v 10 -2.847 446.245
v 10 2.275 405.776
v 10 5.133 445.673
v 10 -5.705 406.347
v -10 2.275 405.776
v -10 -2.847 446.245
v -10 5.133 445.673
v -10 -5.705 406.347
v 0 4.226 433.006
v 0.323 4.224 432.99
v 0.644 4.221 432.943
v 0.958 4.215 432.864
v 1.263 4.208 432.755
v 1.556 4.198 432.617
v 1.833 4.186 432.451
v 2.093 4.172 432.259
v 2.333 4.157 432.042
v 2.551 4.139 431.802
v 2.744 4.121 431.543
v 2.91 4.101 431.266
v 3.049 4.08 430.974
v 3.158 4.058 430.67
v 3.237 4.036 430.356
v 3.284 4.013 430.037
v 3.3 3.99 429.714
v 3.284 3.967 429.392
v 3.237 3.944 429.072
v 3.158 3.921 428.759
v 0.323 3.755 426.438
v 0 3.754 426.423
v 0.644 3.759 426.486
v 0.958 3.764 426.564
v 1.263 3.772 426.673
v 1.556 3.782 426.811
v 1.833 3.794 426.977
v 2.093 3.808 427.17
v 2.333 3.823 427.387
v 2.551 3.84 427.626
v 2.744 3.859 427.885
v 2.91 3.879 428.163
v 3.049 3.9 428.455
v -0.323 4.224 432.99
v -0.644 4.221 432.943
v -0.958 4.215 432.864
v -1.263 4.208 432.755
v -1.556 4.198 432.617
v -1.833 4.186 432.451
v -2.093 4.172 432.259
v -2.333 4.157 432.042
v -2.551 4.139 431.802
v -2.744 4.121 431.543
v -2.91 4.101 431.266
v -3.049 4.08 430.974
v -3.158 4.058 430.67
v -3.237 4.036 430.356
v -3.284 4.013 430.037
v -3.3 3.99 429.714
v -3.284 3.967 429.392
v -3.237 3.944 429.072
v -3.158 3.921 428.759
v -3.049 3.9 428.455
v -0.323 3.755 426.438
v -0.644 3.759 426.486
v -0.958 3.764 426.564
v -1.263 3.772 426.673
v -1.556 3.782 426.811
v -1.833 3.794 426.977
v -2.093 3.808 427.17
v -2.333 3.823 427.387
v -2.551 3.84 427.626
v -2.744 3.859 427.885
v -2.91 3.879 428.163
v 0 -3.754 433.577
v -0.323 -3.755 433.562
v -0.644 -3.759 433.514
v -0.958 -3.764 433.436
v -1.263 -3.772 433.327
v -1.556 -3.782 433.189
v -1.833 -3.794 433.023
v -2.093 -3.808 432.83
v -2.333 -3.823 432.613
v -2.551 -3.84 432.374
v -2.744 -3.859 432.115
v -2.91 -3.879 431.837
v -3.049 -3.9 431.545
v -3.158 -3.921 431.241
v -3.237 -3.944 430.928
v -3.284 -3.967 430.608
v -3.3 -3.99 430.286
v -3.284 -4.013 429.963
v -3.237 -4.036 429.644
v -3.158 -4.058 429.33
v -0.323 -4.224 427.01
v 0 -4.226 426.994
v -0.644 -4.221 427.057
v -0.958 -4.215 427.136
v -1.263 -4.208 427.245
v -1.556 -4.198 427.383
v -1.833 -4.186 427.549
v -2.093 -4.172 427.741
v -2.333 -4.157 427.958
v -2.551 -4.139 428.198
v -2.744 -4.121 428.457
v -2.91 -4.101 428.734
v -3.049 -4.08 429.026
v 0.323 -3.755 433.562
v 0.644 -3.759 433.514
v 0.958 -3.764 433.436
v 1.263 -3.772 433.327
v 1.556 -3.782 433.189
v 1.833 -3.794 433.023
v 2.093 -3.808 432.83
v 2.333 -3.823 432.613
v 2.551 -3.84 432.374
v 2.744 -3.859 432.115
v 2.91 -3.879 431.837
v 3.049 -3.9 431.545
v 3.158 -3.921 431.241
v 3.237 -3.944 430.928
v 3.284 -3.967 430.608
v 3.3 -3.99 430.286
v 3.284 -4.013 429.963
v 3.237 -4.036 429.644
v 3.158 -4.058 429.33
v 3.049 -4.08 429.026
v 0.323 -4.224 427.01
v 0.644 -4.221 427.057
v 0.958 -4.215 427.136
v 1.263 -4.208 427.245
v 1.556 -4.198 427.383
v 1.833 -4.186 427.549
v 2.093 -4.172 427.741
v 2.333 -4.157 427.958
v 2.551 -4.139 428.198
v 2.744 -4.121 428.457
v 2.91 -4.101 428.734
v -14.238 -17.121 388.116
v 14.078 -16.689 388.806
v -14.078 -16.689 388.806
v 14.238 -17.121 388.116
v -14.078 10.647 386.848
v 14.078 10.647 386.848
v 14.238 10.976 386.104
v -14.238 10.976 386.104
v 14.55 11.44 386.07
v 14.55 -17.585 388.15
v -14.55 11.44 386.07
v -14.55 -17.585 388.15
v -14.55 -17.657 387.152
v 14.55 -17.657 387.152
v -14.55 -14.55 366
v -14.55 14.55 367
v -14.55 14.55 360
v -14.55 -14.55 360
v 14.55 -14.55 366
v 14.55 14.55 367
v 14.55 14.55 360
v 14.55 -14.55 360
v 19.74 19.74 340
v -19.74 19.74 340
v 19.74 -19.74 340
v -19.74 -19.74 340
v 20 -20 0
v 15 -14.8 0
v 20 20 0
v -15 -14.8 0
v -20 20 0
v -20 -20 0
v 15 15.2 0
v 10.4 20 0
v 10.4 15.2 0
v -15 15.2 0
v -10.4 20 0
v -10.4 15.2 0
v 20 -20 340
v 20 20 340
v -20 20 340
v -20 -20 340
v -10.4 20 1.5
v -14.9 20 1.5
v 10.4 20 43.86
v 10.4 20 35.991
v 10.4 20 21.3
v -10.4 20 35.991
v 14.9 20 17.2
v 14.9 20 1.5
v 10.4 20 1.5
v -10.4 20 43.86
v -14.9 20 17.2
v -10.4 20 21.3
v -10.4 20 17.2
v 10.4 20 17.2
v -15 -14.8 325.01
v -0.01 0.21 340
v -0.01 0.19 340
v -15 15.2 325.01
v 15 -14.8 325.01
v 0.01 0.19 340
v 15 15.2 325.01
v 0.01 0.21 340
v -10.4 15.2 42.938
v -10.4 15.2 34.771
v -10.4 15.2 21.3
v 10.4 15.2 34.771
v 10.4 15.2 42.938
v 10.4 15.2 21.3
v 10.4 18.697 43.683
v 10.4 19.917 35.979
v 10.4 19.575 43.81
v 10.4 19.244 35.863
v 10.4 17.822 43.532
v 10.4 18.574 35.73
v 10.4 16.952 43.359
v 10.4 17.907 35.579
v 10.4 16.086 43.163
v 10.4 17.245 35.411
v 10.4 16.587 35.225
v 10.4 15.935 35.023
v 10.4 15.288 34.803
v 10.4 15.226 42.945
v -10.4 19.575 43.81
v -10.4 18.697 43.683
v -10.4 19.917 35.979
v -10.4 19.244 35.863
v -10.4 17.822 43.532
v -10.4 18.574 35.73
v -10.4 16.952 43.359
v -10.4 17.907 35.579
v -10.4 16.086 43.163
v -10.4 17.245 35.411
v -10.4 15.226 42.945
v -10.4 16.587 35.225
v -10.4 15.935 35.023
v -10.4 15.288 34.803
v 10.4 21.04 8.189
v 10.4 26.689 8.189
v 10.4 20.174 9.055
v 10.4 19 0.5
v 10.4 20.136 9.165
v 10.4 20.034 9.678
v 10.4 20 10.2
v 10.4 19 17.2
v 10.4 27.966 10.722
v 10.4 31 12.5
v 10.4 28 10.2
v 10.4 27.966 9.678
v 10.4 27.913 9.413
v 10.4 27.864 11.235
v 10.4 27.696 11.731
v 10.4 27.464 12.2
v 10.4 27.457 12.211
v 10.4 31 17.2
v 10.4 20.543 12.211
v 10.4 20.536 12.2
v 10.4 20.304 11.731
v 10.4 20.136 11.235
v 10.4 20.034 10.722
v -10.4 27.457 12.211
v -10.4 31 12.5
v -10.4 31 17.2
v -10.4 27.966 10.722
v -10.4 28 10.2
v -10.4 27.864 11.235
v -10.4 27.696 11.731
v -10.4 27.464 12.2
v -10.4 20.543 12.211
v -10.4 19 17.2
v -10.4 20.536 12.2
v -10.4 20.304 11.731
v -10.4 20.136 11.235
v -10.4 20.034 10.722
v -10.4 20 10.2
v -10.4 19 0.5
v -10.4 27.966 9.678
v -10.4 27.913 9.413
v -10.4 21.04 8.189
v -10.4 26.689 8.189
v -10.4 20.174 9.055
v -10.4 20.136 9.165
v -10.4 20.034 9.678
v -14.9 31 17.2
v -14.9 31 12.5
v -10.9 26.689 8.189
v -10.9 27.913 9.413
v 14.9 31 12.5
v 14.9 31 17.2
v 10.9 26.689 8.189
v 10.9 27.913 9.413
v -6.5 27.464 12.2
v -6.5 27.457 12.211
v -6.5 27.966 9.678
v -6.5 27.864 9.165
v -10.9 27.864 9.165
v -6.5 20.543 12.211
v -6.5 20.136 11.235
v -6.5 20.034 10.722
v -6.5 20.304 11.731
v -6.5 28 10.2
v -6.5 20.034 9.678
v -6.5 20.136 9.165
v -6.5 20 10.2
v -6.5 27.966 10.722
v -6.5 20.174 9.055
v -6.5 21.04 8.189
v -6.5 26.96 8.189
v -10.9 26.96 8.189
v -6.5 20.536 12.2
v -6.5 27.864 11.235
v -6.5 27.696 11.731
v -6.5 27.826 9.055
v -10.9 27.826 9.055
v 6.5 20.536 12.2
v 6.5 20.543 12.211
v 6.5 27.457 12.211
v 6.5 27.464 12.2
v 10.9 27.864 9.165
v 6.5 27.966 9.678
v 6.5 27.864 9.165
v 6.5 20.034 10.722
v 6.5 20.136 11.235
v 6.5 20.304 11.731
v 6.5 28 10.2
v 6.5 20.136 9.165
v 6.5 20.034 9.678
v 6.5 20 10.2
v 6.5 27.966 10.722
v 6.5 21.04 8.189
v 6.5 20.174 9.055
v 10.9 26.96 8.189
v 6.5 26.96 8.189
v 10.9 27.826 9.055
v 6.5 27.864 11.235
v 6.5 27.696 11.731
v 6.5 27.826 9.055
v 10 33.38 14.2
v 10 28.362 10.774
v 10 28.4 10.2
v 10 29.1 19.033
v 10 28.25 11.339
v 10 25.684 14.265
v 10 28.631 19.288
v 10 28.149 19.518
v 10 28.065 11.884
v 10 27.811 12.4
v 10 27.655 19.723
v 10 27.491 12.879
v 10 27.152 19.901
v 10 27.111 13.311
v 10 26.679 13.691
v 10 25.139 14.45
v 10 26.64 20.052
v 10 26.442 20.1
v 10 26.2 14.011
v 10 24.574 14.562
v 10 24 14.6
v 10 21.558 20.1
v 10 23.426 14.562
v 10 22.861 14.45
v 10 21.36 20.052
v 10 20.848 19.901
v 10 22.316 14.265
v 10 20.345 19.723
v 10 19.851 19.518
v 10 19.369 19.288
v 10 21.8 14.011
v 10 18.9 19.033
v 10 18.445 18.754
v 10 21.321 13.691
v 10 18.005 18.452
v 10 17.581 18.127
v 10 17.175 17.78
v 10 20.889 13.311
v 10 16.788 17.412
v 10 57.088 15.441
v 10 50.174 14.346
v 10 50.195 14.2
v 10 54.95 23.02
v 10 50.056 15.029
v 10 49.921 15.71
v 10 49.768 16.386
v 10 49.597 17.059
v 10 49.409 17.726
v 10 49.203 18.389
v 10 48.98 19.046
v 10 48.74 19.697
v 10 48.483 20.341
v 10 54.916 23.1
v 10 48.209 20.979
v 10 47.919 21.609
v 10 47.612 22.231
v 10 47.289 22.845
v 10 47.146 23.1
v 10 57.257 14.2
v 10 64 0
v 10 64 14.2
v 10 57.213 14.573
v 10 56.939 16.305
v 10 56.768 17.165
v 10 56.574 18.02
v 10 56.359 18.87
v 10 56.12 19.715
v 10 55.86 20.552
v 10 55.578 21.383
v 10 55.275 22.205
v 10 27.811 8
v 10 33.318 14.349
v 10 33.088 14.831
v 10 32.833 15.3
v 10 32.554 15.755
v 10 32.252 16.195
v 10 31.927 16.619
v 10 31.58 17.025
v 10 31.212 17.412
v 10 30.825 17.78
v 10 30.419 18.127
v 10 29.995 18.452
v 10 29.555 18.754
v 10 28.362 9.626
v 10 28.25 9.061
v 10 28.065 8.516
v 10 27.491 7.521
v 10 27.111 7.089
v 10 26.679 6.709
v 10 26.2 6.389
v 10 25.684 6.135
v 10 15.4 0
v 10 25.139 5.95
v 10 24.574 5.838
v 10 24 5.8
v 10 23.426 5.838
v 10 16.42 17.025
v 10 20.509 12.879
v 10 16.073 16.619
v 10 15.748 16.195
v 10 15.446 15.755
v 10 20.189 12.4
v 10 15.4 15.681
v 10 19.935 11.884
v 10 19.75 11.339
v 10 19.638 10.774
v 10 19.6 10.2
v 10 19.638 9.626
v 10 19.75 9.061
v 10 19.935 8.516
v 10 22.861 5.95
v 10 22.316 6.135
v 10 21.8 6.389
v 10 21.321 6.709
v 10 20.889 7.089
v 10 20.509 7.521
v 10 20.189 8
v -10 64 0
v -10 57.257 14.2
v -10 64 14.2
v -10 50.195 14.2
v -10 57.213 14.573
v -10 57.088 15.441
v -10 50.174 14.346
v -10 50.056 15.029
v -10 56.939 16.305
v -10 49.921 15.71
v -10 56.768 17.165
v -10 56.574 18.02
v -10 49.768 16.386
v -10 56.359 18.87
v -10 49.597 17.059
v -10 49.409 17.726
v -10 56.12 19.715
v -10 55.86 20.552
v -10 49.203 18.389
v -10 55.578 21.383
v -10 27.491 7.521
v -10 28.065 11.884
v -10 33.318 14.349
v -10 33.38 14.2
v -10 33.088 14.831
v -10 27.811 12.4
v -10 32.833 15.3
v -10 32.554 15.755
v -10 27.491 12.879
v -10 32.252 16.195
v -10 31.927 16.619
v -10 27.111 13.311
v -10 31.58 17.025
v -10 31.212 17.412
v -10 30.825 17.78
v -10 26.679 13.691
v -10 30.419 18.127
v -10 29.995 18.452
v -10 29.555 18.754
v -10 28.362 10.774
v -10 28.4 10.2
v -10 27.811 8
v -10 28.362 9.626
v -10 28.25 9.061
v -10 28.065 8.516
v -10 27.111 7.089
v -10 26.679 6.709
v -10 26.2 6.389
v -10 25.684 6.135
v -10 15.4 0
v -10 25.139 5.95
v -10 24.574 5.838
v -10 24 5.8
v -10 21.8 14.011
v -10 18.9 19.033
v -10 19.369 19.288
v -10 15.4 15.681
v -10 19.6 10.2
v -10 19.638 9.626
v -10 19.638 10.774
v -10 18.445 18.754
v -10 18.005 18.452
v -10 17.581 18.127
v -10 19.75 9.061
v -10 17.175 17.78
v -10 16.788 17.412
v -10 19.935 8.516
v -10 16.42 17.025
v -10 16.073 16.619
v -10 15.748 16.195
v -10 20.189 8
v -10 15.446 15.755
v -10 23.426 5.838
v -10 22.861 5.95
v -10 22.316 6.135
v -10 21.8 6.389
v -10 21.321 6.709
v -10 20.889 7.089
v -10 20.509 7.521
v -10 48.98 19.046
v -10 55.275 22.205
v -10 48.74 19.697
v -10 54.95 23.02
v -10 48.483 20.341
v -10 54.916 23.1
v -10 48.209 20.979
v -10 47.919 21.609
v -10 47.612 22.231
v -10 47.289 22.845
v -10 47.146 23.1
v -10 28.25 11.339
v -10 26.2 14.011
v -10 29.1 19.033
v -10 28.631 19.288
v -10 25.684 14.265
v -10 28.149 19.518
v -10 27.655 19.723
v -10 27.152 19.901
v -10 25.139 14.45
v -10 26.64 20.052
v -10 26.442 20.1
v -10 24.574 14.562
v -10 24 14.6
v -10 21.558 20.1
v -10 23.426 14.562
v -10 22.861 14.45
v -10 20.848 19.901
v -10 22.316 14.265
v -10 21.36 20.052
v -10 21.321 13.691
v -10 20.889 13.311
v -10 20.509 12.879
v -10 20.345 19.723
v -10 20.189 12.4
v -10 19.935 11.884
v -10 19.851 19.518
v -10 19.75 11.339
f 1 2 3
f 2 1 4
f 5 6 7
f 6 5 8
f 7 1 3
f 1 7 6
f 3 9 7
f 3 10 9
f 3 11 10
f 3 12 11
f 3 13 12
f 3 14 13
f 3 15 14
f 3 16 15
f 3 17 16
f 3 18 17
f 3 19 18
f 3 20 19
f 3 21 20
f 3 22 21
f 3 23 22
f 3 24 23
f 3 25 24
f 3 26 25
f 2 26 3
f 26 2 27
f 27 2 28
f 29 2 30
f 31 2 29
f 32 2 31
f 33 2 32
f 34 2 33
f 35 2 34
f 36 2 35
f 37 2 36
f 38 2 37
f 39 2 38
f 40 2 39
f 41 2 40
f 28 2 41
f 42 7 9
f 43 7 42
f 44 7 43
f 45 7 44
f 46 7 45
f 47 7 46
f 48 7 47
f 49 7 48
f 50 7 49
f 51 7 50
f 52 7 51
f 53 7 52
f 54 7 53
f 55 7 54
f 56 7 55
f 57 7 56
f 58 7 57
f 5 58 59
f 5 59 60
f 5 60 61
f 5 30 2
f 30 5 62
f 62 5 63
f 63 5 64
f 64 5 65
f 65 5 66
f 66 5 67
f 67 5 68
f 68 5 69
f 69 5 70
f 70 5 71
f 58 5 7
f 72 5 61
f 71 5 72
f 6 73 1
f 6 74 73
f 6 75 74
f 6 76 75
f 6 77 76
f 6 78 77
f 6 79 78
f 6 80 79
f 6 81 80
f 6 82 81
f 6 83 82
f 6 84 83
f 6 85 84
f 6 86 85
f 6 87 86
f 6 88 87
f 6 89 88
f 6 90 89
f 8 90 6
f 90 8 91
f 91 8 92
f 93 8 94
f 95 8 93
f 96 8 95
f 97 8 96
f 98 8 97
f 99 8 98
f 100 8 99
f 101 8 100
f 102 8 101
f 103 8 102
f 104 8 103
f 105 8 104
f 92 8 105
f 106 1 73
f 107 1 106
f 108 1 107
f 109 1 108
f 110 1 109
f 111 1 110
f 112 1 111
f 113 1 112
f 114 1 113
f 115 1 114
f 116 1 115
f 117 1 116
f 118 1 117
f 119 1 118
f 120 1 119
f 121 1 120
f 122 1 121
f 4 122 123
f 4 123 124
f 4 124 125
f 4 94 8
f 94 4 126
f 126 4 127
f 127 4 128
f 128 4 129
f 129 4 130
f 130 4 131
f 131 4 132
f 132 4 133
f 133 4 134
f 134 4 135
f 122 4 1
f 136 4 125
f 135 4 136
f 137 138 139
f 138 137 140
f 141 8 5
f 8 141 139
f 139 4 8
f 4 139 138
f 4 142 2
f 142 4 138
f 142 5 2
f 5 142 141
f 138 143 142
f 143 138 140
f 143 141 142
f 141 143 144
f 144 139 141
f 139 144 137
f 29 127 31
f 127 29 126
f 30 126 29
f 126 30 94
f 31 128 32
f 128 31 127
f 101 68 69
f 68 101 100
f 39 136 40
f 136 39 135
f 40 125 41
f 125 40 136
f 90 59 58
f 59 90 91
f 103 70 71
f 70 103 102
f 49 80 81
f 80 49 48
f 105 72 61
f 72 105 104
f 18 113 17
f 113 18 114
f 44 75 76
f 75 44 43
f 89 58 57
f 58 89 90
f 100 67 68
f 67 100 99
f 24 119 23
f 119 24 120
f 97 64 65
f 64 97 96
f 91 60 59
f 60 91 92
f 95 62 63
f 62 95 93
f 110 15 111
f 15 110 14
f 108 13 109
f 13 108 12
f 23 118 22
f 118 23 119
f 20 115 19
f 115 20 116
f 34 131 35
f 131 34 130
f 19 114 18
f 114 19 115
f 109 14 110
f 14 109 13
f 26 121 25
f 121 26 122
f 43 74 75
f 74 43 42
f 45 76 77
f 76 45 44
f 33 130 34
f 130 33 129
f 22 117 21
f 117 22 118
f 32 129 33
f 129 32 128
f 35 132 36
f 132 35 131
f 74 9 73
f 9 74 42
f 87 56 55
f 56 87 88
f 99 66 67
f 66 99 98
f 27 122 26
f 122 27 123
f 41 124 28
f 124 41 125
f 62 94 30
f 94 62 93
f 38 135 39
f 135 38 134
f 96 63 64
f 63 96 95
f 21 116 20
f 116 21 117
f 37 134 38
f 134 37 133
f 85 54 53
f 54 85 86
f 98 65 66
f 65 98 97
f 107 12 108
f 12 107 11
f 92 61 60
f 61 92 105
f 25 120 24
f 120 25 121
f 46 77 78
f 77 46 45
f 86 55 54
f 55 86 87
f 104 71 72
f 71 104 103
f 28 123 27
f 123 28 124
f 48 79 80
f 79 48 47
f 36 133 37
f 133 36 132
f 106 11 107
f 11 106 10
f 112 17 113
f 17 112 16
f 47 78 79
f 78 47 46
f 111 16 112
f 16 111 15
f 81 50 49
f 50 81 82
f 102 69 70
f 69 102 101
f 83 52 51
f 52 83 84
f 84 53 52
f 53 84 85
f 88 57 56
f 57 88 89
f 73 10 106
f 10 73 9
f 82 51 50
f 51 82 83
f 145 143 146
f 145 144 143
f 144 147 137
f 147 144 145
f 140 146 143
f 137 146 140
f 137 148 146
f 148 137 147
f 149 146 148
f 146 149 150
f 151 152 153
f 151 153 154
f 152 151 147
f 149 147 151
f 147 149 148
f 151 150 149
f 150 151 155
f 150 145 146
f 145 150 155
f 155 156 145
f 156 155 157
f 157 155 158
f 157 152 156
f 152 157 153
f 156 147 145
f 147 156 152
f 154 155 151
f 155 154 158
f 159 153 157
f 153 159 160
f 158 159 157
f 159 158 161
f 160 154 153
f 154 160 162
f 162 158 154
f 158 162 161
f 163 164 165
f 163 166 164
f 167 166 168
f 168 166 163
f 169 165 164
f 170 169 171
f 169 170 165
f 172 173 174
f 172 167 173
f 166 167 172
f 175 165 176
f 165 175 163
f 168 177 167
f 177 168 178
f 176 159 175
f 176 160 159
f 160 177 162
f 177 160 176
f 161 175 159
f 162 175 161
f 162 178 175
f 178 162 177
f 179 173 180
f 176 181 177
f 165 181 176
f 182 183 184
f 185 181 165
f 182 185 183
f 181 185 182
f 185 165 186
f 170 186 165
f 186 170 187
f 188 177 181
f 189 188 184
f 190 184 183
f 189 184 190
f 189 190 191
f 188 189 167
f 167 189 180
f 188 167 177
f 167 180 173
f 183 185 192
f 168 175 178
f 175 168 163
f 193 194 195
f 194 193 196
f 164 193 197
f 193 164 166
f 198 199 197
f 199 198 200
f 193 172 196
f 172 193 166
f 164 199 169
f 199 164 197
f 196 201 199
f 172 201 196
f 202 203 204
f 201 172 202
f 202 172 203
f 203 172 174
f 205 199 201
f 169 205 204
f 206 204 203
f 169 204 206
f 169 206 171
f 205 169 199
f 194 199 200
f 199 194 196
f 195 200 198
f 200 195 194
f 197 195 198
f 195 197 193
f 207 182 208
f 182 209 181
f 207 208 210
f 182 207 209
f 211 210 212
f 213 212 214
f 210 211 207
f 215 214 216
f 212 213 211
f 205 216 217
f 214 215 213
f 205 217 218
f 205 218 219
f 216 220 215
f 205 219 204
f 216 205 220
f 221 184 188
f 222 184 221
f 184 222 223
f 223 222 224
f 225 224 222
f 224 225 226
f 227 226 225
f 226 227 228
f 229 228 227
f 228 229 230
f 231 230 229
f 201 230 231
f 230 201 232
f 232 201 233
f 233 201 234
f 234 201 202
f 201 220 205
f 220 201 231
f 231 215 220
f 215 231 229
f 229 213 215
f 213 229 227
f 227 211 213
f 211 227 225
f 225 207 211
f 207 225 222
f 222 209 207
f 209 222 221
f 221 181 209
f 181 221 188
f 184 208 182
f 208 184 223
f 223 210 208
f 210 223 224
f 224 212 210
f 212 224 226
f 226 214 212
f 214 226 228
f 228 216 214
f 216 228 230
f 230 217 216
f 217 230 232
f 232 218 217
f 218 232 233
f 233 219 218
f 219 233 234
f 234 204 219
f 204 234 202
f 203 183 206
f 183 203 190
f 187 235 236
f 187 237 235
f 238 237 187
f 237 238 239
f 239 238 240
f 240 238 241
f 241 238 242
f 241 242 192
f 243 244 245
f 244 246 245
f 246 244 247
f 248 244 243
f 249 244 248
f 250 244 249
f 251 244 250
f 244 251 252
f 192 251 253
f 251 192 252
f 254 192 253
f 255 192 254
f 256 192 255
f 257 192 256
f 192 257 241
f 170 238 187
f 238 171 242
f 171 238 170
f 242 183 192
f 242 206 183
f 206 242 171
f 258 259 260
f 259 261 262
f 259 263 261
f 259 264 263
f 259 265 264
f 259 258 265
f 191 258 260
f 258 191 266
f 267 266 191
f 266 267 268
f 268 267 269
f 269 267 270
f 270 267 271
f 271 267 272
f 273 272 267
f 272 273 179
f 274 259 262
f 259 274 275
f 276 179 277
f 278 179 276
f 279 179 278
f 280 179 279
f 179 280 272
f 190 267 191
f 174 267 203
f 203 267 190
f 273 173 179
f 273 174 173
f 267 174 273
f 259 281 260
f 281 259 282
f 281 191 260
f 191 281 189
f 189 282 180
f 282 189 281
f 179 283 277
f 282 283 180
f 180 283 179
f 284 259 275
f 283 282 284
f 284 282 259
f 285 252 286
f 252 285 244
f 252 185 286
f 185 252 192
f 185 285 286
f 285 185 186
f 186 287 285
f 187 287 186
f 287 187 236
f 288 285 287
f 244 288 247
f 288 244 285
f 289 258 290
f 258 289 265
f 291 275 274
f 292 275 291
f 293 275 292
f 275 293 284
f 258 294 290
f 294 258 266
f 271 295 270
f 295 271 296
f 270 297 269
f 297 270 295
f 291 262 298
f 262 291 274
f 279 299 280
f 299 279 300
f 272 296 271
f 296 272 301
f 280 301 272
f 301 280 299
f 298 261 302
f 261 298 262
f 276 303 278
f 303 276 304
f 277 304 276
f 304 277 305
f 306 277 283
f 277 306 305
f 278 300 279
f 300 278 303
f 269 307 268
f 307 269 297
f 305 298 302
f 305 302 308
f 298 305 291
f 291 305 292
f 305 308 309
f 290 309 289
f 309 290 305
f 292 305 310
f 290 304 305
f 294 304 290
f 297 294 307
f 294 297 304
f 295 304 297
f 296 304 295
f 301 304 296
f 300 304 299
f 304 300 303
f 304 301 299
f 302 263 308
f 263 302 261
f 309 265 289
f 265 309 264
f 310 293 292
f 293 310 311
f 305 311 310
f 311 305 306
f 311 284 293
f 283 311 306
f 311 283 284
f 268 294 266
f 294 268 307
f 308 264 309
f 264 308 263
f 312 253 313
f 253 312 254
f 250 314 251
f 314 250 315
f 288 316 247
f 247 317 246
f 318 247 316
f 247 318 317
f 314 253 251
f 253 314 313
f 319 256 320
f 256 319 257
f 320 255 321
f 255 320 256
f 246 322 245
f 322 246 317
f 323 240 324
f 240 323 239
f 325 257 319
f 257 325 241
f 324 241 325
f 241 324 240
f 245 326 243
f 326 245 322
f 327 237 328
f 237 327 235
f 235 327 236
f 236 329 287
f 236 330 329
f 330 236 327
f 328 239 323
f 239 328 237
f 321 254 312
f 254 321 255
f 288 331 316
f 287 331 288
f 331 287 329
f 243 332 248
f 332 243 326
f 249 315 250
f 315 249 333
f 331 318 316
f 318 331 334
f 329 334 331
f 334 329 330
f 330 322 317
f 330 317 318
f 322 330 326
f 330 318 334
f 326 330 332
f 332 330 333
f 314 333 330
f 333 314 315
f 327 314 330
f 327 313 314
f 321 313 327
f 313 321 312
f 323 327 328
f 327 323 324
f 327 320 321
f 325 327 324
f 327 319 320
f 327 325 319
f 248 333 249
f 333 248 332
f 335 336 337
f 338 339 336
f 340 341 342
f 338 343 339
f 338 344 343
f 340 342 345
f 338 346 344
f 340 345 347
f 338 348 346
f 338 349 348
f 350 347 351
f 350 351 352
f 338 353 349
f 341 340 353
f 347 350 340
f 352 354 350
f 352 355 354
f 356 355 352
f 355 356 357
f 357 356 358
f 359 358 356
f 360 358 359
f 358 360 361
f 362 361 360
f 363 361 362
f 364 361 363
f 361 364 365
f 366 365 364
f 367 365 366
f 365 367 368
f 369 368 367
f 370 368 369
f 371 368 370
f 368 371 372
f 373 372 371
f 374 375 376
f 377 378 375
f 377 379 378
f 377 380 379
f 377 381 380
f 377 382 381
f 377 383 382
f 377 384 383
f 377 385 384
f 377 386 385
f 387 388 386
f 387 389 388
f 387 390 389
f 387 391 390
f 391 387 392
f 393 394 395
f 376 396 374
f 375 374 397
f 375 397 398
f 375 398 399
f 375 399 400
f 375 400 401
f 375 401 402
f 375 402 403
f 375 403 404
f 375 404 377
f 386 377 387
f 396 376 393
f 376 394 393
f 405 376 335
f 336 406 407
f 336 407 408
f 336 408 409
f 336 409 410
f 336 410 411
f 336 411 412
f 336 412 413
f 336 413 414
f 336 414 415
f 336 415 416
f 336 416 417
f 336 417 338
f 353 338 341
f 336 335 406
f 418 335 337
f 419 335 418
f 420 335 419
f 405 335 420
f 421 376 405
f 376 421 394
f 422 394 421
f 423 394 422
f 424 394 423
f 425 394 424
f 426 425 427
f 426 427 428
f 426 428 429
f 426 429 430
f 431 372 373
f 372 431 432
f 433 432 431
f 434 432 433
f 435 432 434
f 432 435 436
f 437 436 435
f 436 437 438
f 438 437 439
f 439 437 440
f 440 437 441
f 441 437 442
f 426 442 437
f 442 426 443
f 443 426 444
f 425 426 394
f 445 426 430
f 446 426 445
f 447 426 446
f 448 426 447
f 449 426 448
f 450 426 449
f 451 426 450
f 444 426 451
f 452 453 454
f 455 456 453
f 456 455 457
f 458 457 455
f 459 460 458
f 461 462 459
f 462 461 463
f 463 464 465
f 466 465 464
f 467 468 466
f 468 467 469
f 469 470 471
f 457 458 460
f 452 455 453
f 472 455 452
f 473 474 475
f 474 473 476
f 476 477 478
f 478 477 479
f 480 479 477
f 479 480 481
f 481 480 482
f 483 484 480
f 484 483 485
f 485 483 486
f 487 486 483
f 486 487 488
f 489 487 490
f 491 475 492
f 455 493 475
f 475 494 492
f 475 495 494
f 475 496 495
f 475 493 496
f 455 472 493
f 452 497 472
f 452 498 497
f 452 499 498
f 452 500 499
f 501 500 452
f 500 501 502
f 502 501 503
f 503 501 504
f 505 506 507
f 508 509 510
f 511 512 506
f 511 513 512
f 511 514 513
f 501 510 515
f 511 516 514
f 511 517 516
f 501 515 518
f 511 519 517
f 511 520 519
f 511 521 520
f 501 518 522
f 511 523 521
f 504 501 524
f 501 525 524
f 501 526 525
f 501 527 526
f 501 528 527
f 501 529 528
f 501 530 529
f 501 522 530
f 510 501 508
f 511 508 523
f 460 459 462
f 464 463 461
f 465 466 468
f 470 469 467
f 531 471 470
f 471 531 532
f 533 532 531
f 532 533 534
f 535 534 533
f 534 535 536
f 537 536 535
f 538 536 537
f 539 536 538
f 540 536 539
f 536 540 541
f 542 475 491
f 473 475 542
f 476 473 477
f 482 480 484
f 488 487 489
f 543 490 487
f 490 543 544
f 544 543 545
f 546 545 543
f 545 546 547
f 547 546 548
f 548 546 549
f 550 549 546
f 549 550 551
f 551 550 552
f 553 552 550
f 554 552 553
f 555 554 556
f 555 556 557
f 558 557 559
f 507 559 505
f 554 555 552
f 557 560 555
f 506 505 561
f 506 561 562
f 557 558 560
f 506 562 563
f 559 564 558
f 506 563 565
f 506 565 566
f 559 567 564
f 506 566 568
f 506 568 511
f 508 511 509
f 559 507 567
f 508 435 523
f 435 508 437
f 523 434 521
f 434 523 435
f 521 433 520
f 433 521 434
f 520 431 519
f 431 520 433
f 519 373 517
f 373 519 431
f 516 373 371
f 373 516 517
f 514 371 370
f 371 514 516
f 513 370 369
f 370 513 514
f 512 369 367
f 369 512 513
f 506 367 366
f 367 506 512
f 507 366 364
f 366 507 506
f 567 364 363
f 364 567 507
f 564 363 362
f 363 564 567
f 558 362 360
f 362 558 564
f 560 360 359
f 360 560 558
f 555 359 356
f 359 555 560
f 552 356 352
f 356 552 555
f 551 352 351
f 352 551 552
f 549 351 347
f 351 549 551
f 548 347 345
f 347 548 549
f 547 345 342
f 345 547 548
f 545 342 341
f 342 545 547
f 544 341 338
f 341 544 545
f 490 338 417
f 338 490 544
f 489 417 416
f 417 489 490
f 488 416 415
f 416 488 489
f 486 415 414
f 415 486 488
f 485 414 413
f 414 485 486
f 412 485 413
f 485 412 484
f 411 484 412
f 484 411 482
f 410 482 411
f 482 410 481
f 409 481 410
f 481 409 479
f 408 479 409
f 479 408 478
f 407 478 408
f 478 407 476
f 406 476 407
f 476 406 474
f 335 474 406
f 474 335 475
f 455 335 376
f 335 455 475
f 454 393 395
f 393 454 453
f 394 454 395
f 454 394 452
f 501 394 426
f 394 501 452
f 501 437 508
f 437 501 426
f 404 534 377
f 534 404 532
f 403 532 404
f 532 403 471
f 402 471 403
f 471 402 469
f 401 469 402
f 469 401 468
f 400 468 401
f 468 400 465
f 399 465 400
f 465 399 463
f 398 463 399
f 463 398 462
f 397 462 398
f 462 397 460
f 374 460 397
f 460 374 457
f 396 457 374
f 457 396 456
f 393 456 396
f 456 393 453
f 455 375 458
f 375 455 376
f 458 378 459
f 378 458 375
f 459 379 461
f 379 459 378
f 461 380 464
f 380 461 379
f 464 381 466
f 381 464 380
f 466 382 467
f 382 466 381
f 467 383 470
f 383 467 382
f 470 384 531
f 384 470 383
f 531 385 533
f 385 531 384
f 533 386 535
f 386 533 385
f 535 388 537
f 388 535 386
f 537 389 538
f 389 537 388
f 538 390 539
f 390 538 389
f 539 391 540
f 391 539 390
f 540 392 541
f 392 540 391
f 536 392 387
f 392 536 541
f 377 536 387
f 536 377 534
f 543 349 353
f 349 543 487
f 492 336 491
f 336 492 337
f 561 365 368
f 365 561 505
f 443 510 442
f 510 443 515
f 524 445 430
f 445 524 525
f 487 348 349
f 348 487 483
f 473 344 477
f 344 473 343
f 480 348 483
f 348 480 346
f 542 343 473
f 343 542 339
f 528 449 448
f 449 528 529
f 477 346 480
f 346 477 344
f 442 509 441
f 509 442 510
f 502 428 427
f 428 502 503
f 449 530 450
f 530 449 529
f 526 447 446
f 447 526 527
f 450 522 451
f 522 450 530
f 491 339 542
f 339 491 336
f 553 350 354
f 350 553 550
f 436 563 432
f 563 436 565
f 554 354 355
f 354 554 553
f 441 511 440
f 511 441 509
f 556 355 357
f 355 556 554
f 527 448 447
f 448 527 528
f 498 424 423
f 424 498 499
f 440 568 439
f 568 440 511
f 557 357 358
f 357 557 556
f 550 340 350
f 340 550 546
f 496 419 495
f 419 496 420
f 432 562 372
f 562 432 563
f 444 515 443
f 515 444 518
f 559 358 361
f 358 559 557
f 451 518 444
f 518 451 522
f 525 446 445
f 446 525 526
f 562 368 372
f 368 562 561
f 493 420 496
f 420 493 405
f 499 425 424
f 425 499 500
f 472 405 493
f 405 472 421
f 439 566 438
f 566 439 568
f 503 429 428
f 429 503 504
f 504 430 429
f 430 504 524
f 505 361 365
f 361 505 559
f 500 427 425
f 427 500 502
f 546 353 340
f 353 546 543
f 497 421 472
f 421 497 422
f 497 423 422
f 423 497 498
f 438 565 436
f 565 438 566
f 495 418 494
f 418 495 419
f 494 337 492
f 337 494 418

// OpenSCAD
// file: common.scad
// Shared dimensions in mm; FDM fit allowances are design choices, not tolerances
// guaranteed by vendors. Exact mower model/serial and printer remain unknown.
// 76.2 x 38.1 rectangular rail is an UNVERIFIED selected envelope, not a
// specification for all TimeCutters (Toro also sells C-channel frames).
$fn = 64;
frame_rail_w = 76.2;                // depth wrapped by square U-bolt
frame_rail_h = 38.1;                // contact face width between U-bolt legs
frame_ubolt_inside_w = 40;
frame_ubolt_leg_nominal_d = 8;
frame_ubolt_center_pitch = frame_ubolt_inside_w + frame_ubolt_leg_nominal_d;
frame_ubolt_leg_hole_d = 9;
frame_ubolt_backing_t = 3;
frame_ubolt_washer_t = 2.4;
frame_ubolt_nut_h = 8;
frame_ubolt_thread_projection = 3;  // beyond full nut, not a second nut engagement
// Four-bolt printed steering-bar clamp. The bar size is set by the sleeve set below, so nothing
// here needs a caliper reading; see clamp_bar_od_mm.
clamp_tube_clearance_mm = 0.4;
clamp_shell_mm = 10;
clamp_bolt_x_mm = 18;
clamp_bolt_clear_mm = 5.5;          // four M5 clamp bolts
clamp_nut_af_mm = 8.2;
clamp_nut_depth_mm = 4.8;
clamp_pin_bore_mm = 6.6;
clamp_rod_eye_length_mm = 32;
clamp_rod_eye_width_mm = 20;
clamp_rod_eye_t_mm = 8;             // printed single-eye lug thickness
clamp_rod_gap_mm = 9;               // yoke clearance around the eye, nominally 0.5 mm per side
clamp_yoke_span_mm = 42;            // ear width clears the eye through its planar sweep
clamp_yoke_reach_mm = 42;           // total outboard yoke extension from the clamp body
clamp_yoke_root_overlap_mm = 4;     // fuse each printed ear into its half beyond the bar opening
clamp_yoke_sweep_clearance_mm = 1;
// ---- One clamp body, a SET of sleeves: choose the size by trial, not by calipers ----------
// The bore is FIXED (clamp_body_bore_mm) and every sleeve is turned to that one OD, so the body,
// bolts, yoke and pin are printed once per side and never depend on the bar. Which bar the clamp
// takes is set by which sleeve is fitted; the set below spans the plausible range for a mower
// lever, and each sleeve doubles as its own coupon - the bore is a slip fit over that bar OD - so
// the size is chosen by trying them on the bar. Nothing has to be measured. A bar that falls
// between entries needs one more sleeve printed from this list, and the wall assert refuses an
// entry so close to the fixed bore that the sleeve would be too thin to clamp.
clamp_bar_od_mm = [20, 22.2, 25.4, 28.6, 30];   // 13/16 to 1-3/16 in; extend as needed
function clamp_insert_count() = len(clamp_bar_od_mm);
function clamp_insert_bar_mm(index) = clamp_bar_od_mm[index];
function clamp_insert_bore_mm(index) = clamp_bar_od_mm[index] + clamp_tube_clearance_mm;
clamp_insert_clearance_mm = 0.3;    // sleeve OD to clamp bore, per side
clamp_insert_flange_t_mm = 2.5;     // end flange thickness; bears on the clamp end faces
clamp_insert_flange_grip_mm = 2.2;  // flange radial grip beyond the sleeve OD
clamp_insert_protrusion_mm = 3;     // sleeve tube projects past the body's end faces
clamp_insert_flange_gap_mm = 0.1;   // flange to body end face: retention with just fit clearance
// The clamp bore fits the largest sleeve plus clearance; the BAR never touches the body.
clamp_body_bore_mm = 36.4;
clamp_insert_od_mm = clamp_body_bore_mm - 2*clamp_insert_clearance_mm;
function clamp_insert_wall_at_mm(index) = (clamp_insert_od_mm-clamp_insert_bore_mm(index))/2;
function clamp_insert_flange_od_mm(index) = clamp_insert_od_mm + 2*clamp_insert_flange_grip_mm;
clamp_r_mm = clamp_body_bore_mm / 2;
clamp_half_h_mm = clamp_r_mm + clamp_shell_mm;
clamp_bolt_y_mm = clamp_r_mm + 7;
clamp_w_mm = 2 * (clamp_bolt_y_mm + clamp_shell_mm);
clamp_l_mm = 2 * (clamp_bolt_x_mm + 7);

function clamp_rod_eye_sweep_radius_mm() =
    sqrt(pow(clamp_rod_eye_length_mm/2, 2) + pow(clamp_rod_eye_width_mm/2, 2));

// Photo aa8b43: narrow stationary SIX-hole rear bracket, origin at rear opening.
// Y spans the bracket; Z is up. Photo-derived centres, NOT factory tolerances or
// measured threads. Selected M2.5 through-bolts require real steel nuts/washers.
servo_mount_bolt_d_mm = 2.5;
servo_mount_clear_d_mm = 2.9;
servo_mount_washer_od_mm = 6;        // selected M2.5 washer capacity; check actual hardware
servo_mount_washer_t_mm = 1;
servo_mount_nut_af_mm = 5;
servo_mount_nut_h_mm = 2.5;
servo_mount_tool_d_mm = 8;           // selected slim socket envelope, check actual tool
servo_rear_clearance_d_mm = 13.5;    // capacity for photo opening estimate 12 +/- 1.5
function servo_rear_hole_points_mm() =
    [[-10,18.5],[10,18.5],[-8,8],[8,8],[-8,-7.5],[8,-7.5]];
// Cutter-centre travel +/-0.4 in each axis; M2.5 shank centres can reach +/-0.6
// with diametral clearance. Preserves bore-side web; not full photo uncertainty.
function servo_rear_hole_travel_mm(index) = [0.8,0.8];
// Full-X rounded rectangular slots; h is the complete required passage length.
module servo_rear_hole_cut(h) {
    for(i=[0:len(servo_rear_hole_points_mm())-1]) {
        p = servo_rear_hole_points_mm()[i];
        travel = servo_rear_hole_travel_mm(i);
        hull() for(y=[-travel[0]/2,travel[0]/2],z=[-travel[1]/2,travel[1]/2])
            translate([0,p[0]+y,p[1]+z]) rotate([0,90,0])
                cylinder(d=servo_mount_clear_d_mm,h=h);
    }
}
module servo_rear_opening_cut(h) {
    rotate([0,90,0]) cylinder(d=servo_rear_clearance_d_mm,h=h);
}
m3_clear = 3.4;
m4_clear = 4.5;
m5_clear = 5.5;
m6_clear = 6.4;
m8_clear = 8.4;
wall = 5;
clearance = 0.4;

function frame_ubolt_required_leg_length(saddle_t) =
    frame_rail_w + saddle_t + frame_ubolt_backing_t + frame_ubolt_washer_t +
    frame_ubolt_nut_h + frame_ubolt_thread_projection;
function saddle_width(pitch, bore) = pitch + bore + 2 * wall;


module slot(d, len, h) {
    hull() for (x = [-len / 2, len / 2]) translate([x, 0, 0]) cylinder(h = h, d = d);
}
module plate(l, w, t, r = 6) {
    assert(l >= 2 * r && w >= 2 * r && t > 0);
    hull() for (x = [-1, 1], y = [-1, 1])
        translate([x * (l / 2 - r), y * (w / 2 - r), 0]) cylinder(h = t, r = r);
}
module frame_saddle(l, t, span, leg = frame_ubolt_leg_hole_d) {
    assert(l / 2 - span / 2 - leg / 2 >= 5, "U-bolt hole too near saddle end");
    plate(l, saddle_width(frame_ubolt_center_pitch, leg), t, 8);
}
module frame_ubolt_slots(t, span, leg = frame_ubolt_leg_hole_d) {
    for (x = [-1, 1], y = [-1, 1])
        translate([x * span / 2, y * frame_ubolt_center_pitch / 2, -1]) cylinder(h = t + 2, d = leg);
}
// main file
// Drive-lever pushrods for the Toro TimeCutter MAX 50 in MyRIDE (model 77502).
// FIRST-ARTICLE FIT / LOAD-TEST ONLY: not strength-certified for powered steering.
//
// LENGTH IS ESTIMATED. The rod is generated from servo_crank_pin() and lapbar_pin()
// in enclosure_common.scad: the measured 8-1/4 in / 1 ft 6 in servo station plus a
// Toro-photo estimate of the lap-bar clamp point (TORO_77502_LINKAGE.md). Measure
// the three lapbar_pin_* values and the crank, rebuild, then print.
//
// Each rod is one straight two-force member. Both M6 pin axes are global X, so the
// linkage moves in fore-and-aft planes even though the lap bar sits farther outboard
// than the servo crank. The rod is therefore skewed by rod_skew_deg; each eye fitting
// is turned so its faces stay square to its pin while the line between pin centres
// stays on the rod axis (no eccentric bending). The skew is built in: the same prints
// serve both sides, the left rod turned 180 degrees about its own axis.
//
// NO PURCHASED FASTENERS IN THE ROD. Per side: three prints, five bodies.
//   pushrod_servo_end  servo eye, 70 mm stub, 40 mm square tube whose mouth is the joint
//                      socket, with a print-in-place (PIP) joint lever             2 bodies
//   pushrod_sleeve     29.6 mm square spigot, 40 mm sleeve whose mouth carries the PIP rack
//                      lever                                                        2 bodies
//   pushrod_inner      29.1 mm solid bar, lap-bar eye, 19-pocket rack on its +Y face  1 body
// The only steel left at the rod is the two mating pins: the M6 pin in the servo adapter's
// clevis and the M6 pin through the lap-bar clamp's yoke ears, both in double shear.
// Section: 40 mm square tube, 5 mm walls, and the 29.1 mm inner bar (the old 32 mm tube /
// 21.1 mm bar stretched to this span buckles below the servo stall force).
//
// LOCKS: the shared lever of pip_rod_joints.scad, scaled up for this rod.
// * SECTION JOINT. The sleeve's square spigot seats rod_spigot_insert deep in the servo end's
//   bore until its shoulder meets the mouth; the square keys rotation. Closing the joint lever
//   clamps the spigot (lobe flat, over-centre) AND swings a tooth through an arc window in the
//   tube wall into a pocket in the spigot. Tooth flanks, window and pocket walls are arcs about
//   the lever pivot, so pull or push on the rod passes through the pivot and cannot cam the
//   lever open; the load path is spigot -> tooth -> the window's wall (rod_withdraw_blocked).
//   Withdrawal, push and rotation are blocked POSITIVELY, not by friction.
// * ADJUSTABLE PORTION. The same lever on the sleeve's mouth drops its tooth into one of
//   rod_index_count pockets on the bar's +Y face, rod_index_step apart: one setting per pocket.
//   The lobe adds clamp friction, but the tooth is MANDATORY: friction alone near the ~540 N
//   stall is unqualified, and a slipping rod silently changes the steering trim. There is no
//   setting between pockets; finer trim is the servo's software centre offset.
// * Each bore is offset toward its lever by its member's side play, so a locked member,
//   pressed off the lever by the lobe, sits exactly on the rod axis and the end pins stay
//   coaxial with the pieces.
// * Holding target, UNQUALIFIED: each positive lock must hold rod_hold_target_n axially in
//   both directions before the rod steers the mower. Bench-test the coupons (rod_part
//   joint_coupon + joint_coupon_spigot, rack_coupon + rack_coupon_bar), which carry the same
//   modules as the rod pieces plus a Ø6.6 test-pin bore in a solid grip.
//
// PRINTING. The two PIP pieces print UPRIGHT with their lever mouth on the bed: the lever
// prints open beside the mouth, arm radial on the bed, and every body touches the bed. The
// servo end stands 446 mm with its eye on top; the sleeve stands 406 mm with its spigot on
// top. The inner bar prints lying flat (rod +Z up) as before, so its rack pockets are slots in a
// vertical side face and the webs between them shear across the layers, not along one.
// The levers sit on the rod's +Y face, which rod_between_points() turns OUTBOARD on both sides.
//
// Public interface (use <pushrod.scad>):
//   rod_assembly(index, phi), rod_between_points(p1, p2, index), rod_gauge(index)
//   rod_pin_length(index), rod_last_setting(), rod_nominal_setting(), rod_skew()
//   rod_eye_fitting(), rod_servo_end(), rod_sleeve(), rod_inner(), rod_outer(phi)
//   rod_joint_lever(phi), rod_rack_lever(phi), rod_joint_tooth(phi), rod_rack_tooth(phi)
//   (phi: 0 open as printed, 90 closed); probe helpers listed beside their definitions.
// CLI: -D rod_part="servo_end"|"sleeve"|"inner"|"gauge"|"joint_coupon"|"joint_coupon_spigot"
//      |"rack_coupon"|"rack_coupon_bar"; -D rod_gauge_index=0|1|2.
include <enclosure_common.scad>
use <pip_rod_joints.scad>

rod_part = "servo_end";
rod_index = 9;                      // a rack pocket: 0 shortest .. 18 longest, 9 nominal
rod_gauge_index = 1;

rod_w = 40;
rod_wall = 5;
rod_bore_w = rod_w-2*rod_wall;
rod_slide_clr = 0.45;               // per side; tune with rod_gauge()
rod_inner_w = rod_bore_w-2*rod_slide_clr;
rod_spigot_w = rod_bore_w-0.4;      // 0.2 mm per side in the socket
rod_pin_bore = clamp_pin_bore_mm;
// Rack: one setting per pocket, 12 mm apart (finer than the old 15 mm bolt steps).
rod_index_step = 12;
rod_index_count = 19;
rod_nominal_index = 9;
// What the adjustment buys, stated in millimetres rather than asserted in prose:
rod_fwd_tolerance_mm = 101.6;       // +/- 4 in on the fore-aft estimate (TORO_77502_LINKAGE.md)
rod_legacy_span_mm = 210;           // the bolted rod's 210 mm adjustment, kept as a floor
// Layout along the rod, servo pin at x = 0 (print-plan values, not mower measurements).
rod_joint_x = 430;                  // servo end's socket mouth = the sleeve's shoulder
rod_sleeve_x = 766;                 // sleeve mouth: the rack lever
rod_spigot_insert = 70;             // spigot depth in the socket
rod_spigot_lead = 1.5;              // 45-degree lead chamfer on the spigot and bar tips
rod_plug = 5;                       // solid between the spigot and the sleeve's bore roof
rod_roof = rod_bore_w/2;            // bore ends in a 45-degree pyramid (prints unsupported)
rod_inner_reach = 380;              // inner pin to inner tip
rod_min_overlap = 90;               // bar inside the sleeve at the longest setting
rod_tip_margin = 2;                 // bar tip to the sleeve's bore roof at the shortest
rod_bed_x = 398;                    // lying-flat inner bar, usable bed X 400
rod_print_h = 488;                  // upright pieces, usable height 490
rod_hold_target_n = 2*540;          // 2 x the ~540 N stall at a 30 mm horn (UNQUALIFIED)
// Levers (pip_rod_joints.scad), the same for both locks. Load-bearing sizes: the tooth's
// shear face is rod_tooth_w x rod_lever_w; its bearing depth is rod_pocket_d - 0.8 mm tip
// clearance; the pins only locate the lever and carry the clamp reaction.
rod_lever_side = 0;                 // levers on the rod's +Y face
rod_lever_n = [0,cos(rod_lever_side),sin(rod_lever_side)];  // the lever face's outward normal
rod_lever_pivot_out = 4;
rod_lever_arm = 40;
rod_lever_w = 20;
rod_lever_pin_r = 4;
rod_tooth_lt = 30;                  // tooth centre radius about the pivot (= 2.5 pitches)
rod_tooth_w = 7;                    // tooth thickness along the rod, closed
rod_pocket_d = 4.5;
rod_lever_gap = 0.4;                // PIP gap (pip_lever_spec default)
// Bore offsets toward the lever: the member's side play.
rod_joint_dz = (rod_bore_w-rod_spigot_w)/2;
rod_rack_dz = rod_slide_clr;
rod_coupon_grip = 27;               // solid test-pin grip on each coupon
rod_coupon_spigot_stub = 30;

rod_eye_len = clamp_rod_eye_length_mm;
rod_eye_w = clamp_rod_eye_width_mm;
rod_eye_t = clamp_rod_eye_t_mm;
rod_pin_edge = rod_eye_len/2;
rod_neck_len = 8;
rod_taper_len = 20;
rod_fit_len = rod_pin_edge+rod_neck_len+rod_taper_len;
rod_bridge_len = 20;
rod_servo_stub = 70;                // narrow bar clears the servo body through crank travel
rod_servo_flare = 20;
rod_tube_start = rod_servo_stub+rod_servo_flare;

rod_neutral = lapbar_pin(1)-servo_crank_pin(1);
rod_lateral_offset = rod_neutral[0];
rod_planar_span = norm([rod_neutral[1], rod_neutral[2]]);
rod_nominal_len = norm(rod_neutral);
rod_skew_deg = asin(rod_lateral_offset/rod_nominal_len);
rod_trim_shift = rod_index_step*sin(rod_skew_deg);  // eye-plane change per index step

function rod_joint_spec() =
    pip_lever_spec(rod_w/2-rod_joint_dz, rod_bore_w/2, rod_spigot_w/2,
                   pivot_out=rod_lever_pivot_out, arm=rod_lever_arm, width=rod_lever_w,
                   pin_r=rod_lever_pin_r, gap=rod_lever_gap, tooth_lt=rod_tooth_lt,
                   tooth_w=rod_tooth_w, pocket_d=rod_pocket_d);
function rod_rack_spec() =
    pip_lever_spec(rod_w/2-rod_rack_dz, rod_bore_w/2, rod_inner_w/2,
                   pivot_out=rod_lever_pivot_out, arm=rod_lever_arm, width=rod_lever_w,
                   pin_r=rod_lever_pin_r, gap=rod_lever_gap, tooth_lt=rod_tooth_lt,
                   tooth_w=rod_tooth_w, pocket_d=rod_pocket_d);
function rod_pin_length(index) = rod_nominal_len+(index-rod_nominal_index)*rod_index_step;
function rod_last_setting() = rod_index_count-1;
rod_min_len = rod_pin_length(0);
rod_max_len = rod_pin_length(rod_last_setting());
function rod_adjust_range_mm() = rod_max_len-rod_min_len;
function rod_inner_tip(index) = rod_pin_length(index)-rod_inner_reach;
rod_fit_reach = rod_fit_len+rod_bridge_len;         // pin to the clean 29.1 mm bar
rod_bore_end = rod_joint_x+rod_plug+rod_roof;        // sleeve bore full section from here
// Closed tooth centre on the rod, and pocket k's centre on the bar (bar pin at 0, bar to -X).
function rod_tooth_x(s, mouth) = mouth-pip_get(s,"rb")-rod_tooth_lt;
function rod_pocket_x(k) = rod_tooth_x(rod_rack_spec(),rod_sleeve_x)-rod_pin_length(k);
rod_pocket_half = rod_tooth_w/2+rod_lever_gap;
// `use <pushrod.scad>` imports functions, not variables: public values go through these.
function rod_nominal_setting() = rod_nominal_index;
function rod_skew() = rod_skew_deg;

assert(rod_part == "servo_end" || rod_part == "sleeve" || rod_part == "inner"
       || rod_part == "gauge" || rod_part == "joint_coupon" || rod_part == "joint_coupon_spigot"
       || rod_part == "rack_coupon" || rod_part == "rack_coupon_bar",
       "rod_part must be servo_end, sleeve, inner, gauge, joint_coupon, joint_coupon_spigot, rack_coupon or rack_coupon_bar");
assert(rod_index >= 0 && rod_index <= rod_last_setting(),
       "rod_index must select a rack pocket");
assert(rod_lateral_offset >= 0,
       "The lap-bar clamp pin must be outboard of (or level with) the servo crank pin");
assert(rod_trim_shift+0.5 <= (servo_adapter_gap_mm-rod_eye_t)/2,
       "Trim moves the servo eye beyond the double-shear adapter's shim clearance");
// The point of the rack: span the mower's fore-aft uncertainty with printed parts, so the clamp
// point stays a choice inside the estimated band instead of a tape reading.
assert(rod_adjust_range_mm() >= 2*rod_fwd_tolerance_mm && rod_adjust_range_mm() >= rod_legacy_span_mm,
       "Rack span is under the estimate's uncertainty or the bolted rod's 210 mm; add pockets");
assert(rod_index_step-2*rod_pocket_half >= 4,
       "Rack pockets would leave less than 4 mm of bar between them");
// The lobe's clamp flat sits under the pivot, rod_tooth_lt from the tooth: half a pitch off the
// pocket row puts it on the bar web between two pockets at every setting, not over a pocket.
assert(abs(rod_tooth_lt % rod_index_step - rod_index_step/2) < 0.01,
       "The rack lever's clamp flat would land over a pocket");
assert(rod_sleeve_x-rod_inner_tip(rod_last_setting()) >= rod_min_overlap,
       "At the longest setting the bar overlaps the sleeve too little");
assert(rod_inner_tip(0) >= rod_bore_end+rod_tip_margin,
       "At the shortest setting the bar tip reaches the sleeve's bore roof");
assert(rod_pocket_x(rod_last_setting())-rod_pocket_half+rod_inner_reach >= 20,
       "The deepest rack pocket lacks bar-tip margin");
assert(-rod_fit_reach-(rod_pocket_x(0)+rod_pocket_half) >= 8,
       "The nearest rack pocket runs into the eye transition");
assert(rod_min_len-rod_fit_reach >= rod_sleeve_x+2,
       "At the shortest setting the eye transition enters the sleeve mouth");
assert(rod_tooth_x(rod_joint_spec(),rod_joint_x)-rod_pocket_half
       -(rod_joint_x-rod_spigot_insert+rod_spigot_lead) >= 10,
       "The joint pocket runs off the spigot's tip");
assert(rod_joint_x+rod_pin_edge+1 <= rod_print_h && rod_sleeve_x-rod_joint_x+rod_spigot_insert <= rod_print_h,
       "An upright rod piece exceeds the usable print height");
assert(rod_inner_reach+rod_pin_edge+1 <= rod_bed_x, "The inner bar exceeds the usable bed X");
assert(rod_eye_t+0.5 <= clamp_rod_gap_mm, "Rod eye exceeds the clamp yoke clearance");
assert(rod_pin_edge+rod_neck_len >= clamp_rod_eye_sweep_radius_mm()+clamp_yoke_sweep_clearance_mm,
       "Thin eye neck must extend past the clamp yoke sweep before the rod widens");
assert(rod_pin_edge >= 1.5*rod_pin_bore, "Eye pin edge distance is too small");

// Pin at the origin, fitting axis +X, pin axis Y; 8 mm eye thickness along Y.
// Turned by -rod_skew_deg about Z wherever it is placed on the rod axis.
module rod_eye_fitting() {
    difference() {
        union() {
            translate([-rod_pin_edge,-rod_eye_t/2,-rod_eye_w/2])
                cube([rod_pin_edge+rod_eye_len/2+rod_neck_len+1,rod_eye_t,rod_eye_w]);
            // Ends just inside the bridge hull so no coplanar faces round to slivers.
            translate([rod_pin_edge+rod_neck_len,0,0]) rotate([0,90,0])
                linear_extrude(height=rod_taper_len-0.5,
                               scale=[(rod_inner_w-0.4)/rod_eye_w,
                                      (rod_inner_w-0.4)/rod_eye_t])
                    square([rod_eye_w,rod_eye_t],center=true);
        }
        rotate([90,0,0]) cylinder(d=rod_pin_bore,h=rod_eye_t+2,center=true);
    }
}
module rod_square(x0, x1, w) {
    translate([x0,-w/2,-w/2]) cube([x1-x0,w,w]);
}
// Square frustum along X: w0 at x0 to w1 at x1.
module rod_frustum_x(x0, w0, x1, w1) {
    hull() {
        translate([x0,-w0/2,-w0/2]) cube([0.01,w0,w0]);
        translate([x1-0.01,-w1/2,-w1/2]) cube([0.01,w1,w1]);
    }
}
// Fitting frame at the rod pin x=pin, facing the rod (dir=+1 at the servo, -1 at
// the lap bar), turned so the eye faces stay square to the global pin axis.
module rod_end_frame(pin, dir) {
    translate([pin,0,0]) rotate([0,0,-rod_skew_deg])
        if (dir > 0) children(); else mirror([1,0,0]) children();
}
// Fitting plus a hull into the 29.1 mm bar centred on the pin-to-pin axis.
module rod_end(pin, dir) {
    rod_end_frame(pin,dir) rod_eye_fitting();
    hull() {
        rod_end_frame(pin,dir) rod_square(rod_fit_len-1,rod_fit_len,rod_inner_w);
        rod_square(pin+dir*(rod_fit_len+rod_bridge_len)-(dir > 0 ? 1 : 0),
                   pin+dir*(rod_fit_len+rod_bridge_len)+(dir > 0 ? 0 : 1),rod_inner_w);
    }
}
// Bore cavity of a tube: a 45-degree pyramid roof from its apex at x=apex, then the full
// bore to just past x1 (the mouth). Placed at the bore's offset by the caller.
module rod_bore_cavity(apex, x1) {
    rod_frustum_x(apex,0.02,apex+rod_roof,rod_bore_w);
    rod_square(apex+rod_roof-0.01,x1+1,rod_bore_w);
}
// Maps a pip_rod_joints.scad lever placement onto the rod: the lever's housing axis is the
// rod's +X (mouth facing +X at x=mouth), its bore centre offset dz along rod_lever_n, the lever
// on that face. Lever-local +x (outward) -> rod_lever_n; its pivot axis -> rod Z.
module rod_lever_frame(s, mouth, dz) {
    translate(dz*rod_lever_n) multmatrix([[0,0,1,0],[1,0,0,0],[0,1,0,0],[0,0,0,1]])
        pip_at_lever(s,mouth,rod_lever_side) children();
}
module rod_joint_cuts() { rod_lever_frame(rod_joint_spec(),rod_joint_x,rod_joint_dz) pip_lever_housing_cuts(rod_joint_spec()); }
module rod_joint_adds() { rod_lever_frame(rod_joint_spec(),rod_joint_x,rod_joint_dz) pip_lever_housing_adds(rod_joint_spec()); }
module rod_rack_cuts() { rod_lever_frame(rod_rack_spec(),rod_sleeve_x,rod_rack_dz) pip_lever_housing_cuts(rod_rack_spec()); }
module rod_rack_adds() { rod_lever_frame(rod_rack_spec(),rod_sleeve_x,rod_rack_dz) pip_lever_housing_adds(rod_rack_spec()); }
// Pockets, in the frame of a member that sits on the rod axis (its locked pose).
module rod_joint_pocket() { rod_lever_frame(rod_joint_spec(),rod_joint_x,rod_joint_dz) pip_lever_pocket(rod_joint_spec()); }
module rod_rack_pocket() { rod_lever_frame(rod_rack_spec(),rod_sleeve_x,rod_rack_dz) pip_lever_pocket(rod_rack_spec()); }
// Levers and their teeth at angle phi: 0 open (as printed), 90 closed.
module rod_joint_lever(phi = 90) {
    rod_lever_frame(rod_joint_spec(),rod_joint_x,rod_joint_dz) rotate([0,phi,0]) pip_lever(rod_joint_spec());
}
module rod_rack_lever(phi = 90) {
    rod_lever_frame(rod_rack_spec(),rod_sleeve_x,rod_rack_dz) rotate([0,phi,0]) pip_lever(rod_rack_spec());
}
module rod_joint_tooth(phi = 90) {
    rod_lever_frame(rod_joint_spec(),rod_joint_x,rod_joint_dz) rotate([0,phi,0]) pip_lever_tooth(rod_joint_spec());
}
module rod_rack_tooth(phi = 90) {
    rod_lever_frame(rod_rack_spec(),rod_sleeve_x,rod_rack_dz) rotate([0,phi,0]) pip_lever_tooth(rod_rack_spec());
}
// Servo end, rod frame: eye, stub, flare, tube; its bore (offset rod_joint_dz) is the socket.
module rod_servo_end() {
    difference() {
        union() {
            rod_end(0,1);
            rod_square(rod_fit_reach-0.5,rod_servo_stub,rod_inner_w);
            translate([rod_servo_stub,0,0]) rotate([0,90,0])
                linear_extrude(height=rod_servo_flare+1,scale=rod_w/rod_inner_w)
                    square(rod_inner_w,center=true);
            rod_square(rod_tube_start,rod_joint_x,rod_w);
        }
        translate(rod_joint_dz*rod_lever_n) rod_bore_cavity(rod_tube_start,rod_joint_x);
        rod_joint_cuts();
    }
    rod_joint_adds();
}
// The sleeve's spigot (rod frame, on the rod axis), with the joint pocket and a lead chamfer.
module rod_spigot() {
    x0 = rod_joint_x-rod_spigot_insert;
    difference() {
        union() {
            rod_frustum_x(x0,rod_spigot_w-2*rod_spigot_lead,x0+rod_spigot_lead,rod_spigot_w);
            rod_square(x0+rod_spigot_lead-0.01,rod_joint_x+0.5,rod_spigot_w);
        }
        rod_joint_pocket();
    }
}
// Sleeve, rod frame: spigot, plug, 40 mm tube; its bore (offset rod_rack_dz) takes the bar.
module rod_sleeve() {
    difference() {
        union() {
            rod_spigot();
            rod_square(rod_joint_x,rod_sleeve_x,rod_w);
        }
        translate(rod_rack_dz*rod_lever_n) rod_bore_cavity(rod_joint_x+rod_plug,rod_sleeve_x);
        rod_rack_cuts();
    }
    rod_rack_adds();
}
// Inner member in its own frame: lap-bar pin at the origin, bar running to -X. Pocket k is
// the one the rack tooth enters at setting k.
module rod_inner() {
    difference() {
        union() {
            rod_end(0,-1);
            rod_square(-rod_inner_reach+rod_spigot_lead-0.01,-rod_fit_reach+0.5,rod_inner_w);
            rod_frustum_x(-rod_inner_reach,rod_inner_w-2*rod_spigot_lead,
                          -rod_inner_reach+rod_spigot_lead,rod_inner_w);
        }
        for(k=[0:rod_last_setting()]) translate([-rod_pin_length(k),0,0]) rod_rack_pocket();
    }
}
module rod_inner_at(index) { translate([rod_pin_length(index),0,0]) rod_inner(); }
module rod_outer(phi = 90) {
    rod_servo_end();
    rod_sleeve();
    rod_joint_lever(phi);
    rod_rack_lever(phi);
}
module rod_assembly(index = rod_index, phi = 90) {
    assert(index >= 0 && index <= rod_last_setting(), "rod_assembly index out of range");
    rod_outer(phi);
    rod_inner_at(index);
    echo(str("rod index=",index," pin_length_mm=",rod_pin_length(index),
             " inner_overlap_mm=",rod_sleeve_x-rod_inner_tip(index),
             " purchased_fasteners_in_rod=0 (end pins: servo M6, clamp-yoke M6)"));
}
// Places the rod between two pin centres. Both pin axes are global X; the X offset
// between them must equal the built skew at this index, so measure and rebuild
// rather than forcing a different lateral offset.
module rod_between_points(p1, p2, index = rod_nominal_index) {
    v = p2-p1;
    len = norm(v);
    e1 = v/len;
    s = e1[0];
    sgn = s < 0 ? -1 : 1;
    c = cos(rod_skew_deg);
    e2 = (sgn*[1,0,0]-abs(s)*e1)/c;
    e3 = cross(e1,e2);
    assert(abs(len-rod_pin_length(index)) < 0.5,
           "Pin centres do not match this rod setting; choose another index or rebuild");
    assert(abs(asin(abs(s))-rod_skew_deg) < 0.2,
           "Pin centres need a different built skew; rebuild with measured endpoints");
    translate(p1) multmatrix([[e1[0],e2[0],e3[0],0],[e1[1],e2[1],e3[1],0],
                              [e1[2],e2[2],e3[2],0],[0,0,0,1]])
        rod_assembly(index);
}
module rod_gauge(index = rod_gauge_index) {
    assert(index >= 0 && index <= 2, "rod_gauge_index must be 0, 1, or 2");
    clr = rod_slide_clr+(index-1)*0.2;
    difference() {
        cube([rod_w,rod_w,rod_w]);
        translate([-0.1,(rod_w-rod_inner_w)/2-clr,(rod_w-rod_inner_w)/2-clr])
            cube([rod_w+0.2,rod_inner_w+2*clr,rod_inner_w+2*clr]);
    }
}
// Probe helpers. The pocket-free envelope of each locked member, so a probe can ask whether
// a closed tooth sits in a real pocket void rather than in a re-derived one.
module rod_joint_member_envelope() {
    rod_square(rod_joint_x-rod_spigot_insert+rod_spigot_lead,rod_joint_x,rod_spigot_w);
}
module rod_rack_member_envelope(index) {
    translate([rod_pin_length(index),0,0])
        rod_square(-rod_inner_reach+rod_spigot_lead,-rod_fit_reach,rod_inner_w);
}
// A ring round a pin axis (global X, i.e. rod Y turned by the skew) at rod x: it meets the
// eye's material only if the eye is really there.
module rod_pin_ring(x) {
    translate([x,0,0]) rotate([0,0,-rod_skew_deg]) rotate([90,0,0])
        difference() {
            cylinder(d=rod_pin_bore+4,h=4,center=true,$fn=48);
            cylinder(d=rod_pin_bore+0.2,h=6,center=true,$fn=48);
        }
}

// Bench coupons: the rod's own lock modules in short pieces with a solid grip and a Ø6.6
// test-pin bore (test-rig hardware only). Load each pair axially in both directions.
module rod_cross_bore(x, axis_y = true) {
    translate([x,0,0]) rotate(axis_y ? [90,0,0] : [0,0,0])
        cylinder(d=rod_pin_bore,h=rod_w+2,center=true,$fn=32);
}
module rod_coupon_housing(mouth, dz, depth) {
    x0 = mouth-depth-rod_roof-rod_coupon_grip;
    difference() {
        rod_square(x0,mouth,rod_w);
        translate(dz*rod_lever_n) rod_bore_cavity(x0+rod_coupon_grip,mouth);
        rod_cross_bore(x0+rod_coupon_grip/2);
        children();
    }
}
rod_joint_coupon_depth = rod_spigot_insert+3;
rod_rack_coupon_bar = [rod_pocket_x(rod_nominal_index)-54, rod_pocket_x(rod_nominal_index)+78];
rod_rack_coupon_depth = rod_sleeve_x-(rod_pin_length(rod_nominal_index)+rod_rack_coupon_bar[0])+3;
module rod_joint_coupon() {
    rod_coupon_housing(rod_joint_x,rod_joint_dz,rod_joint_coupon_depth) rod_joint_cuts();
    rod_joint_adds();
}
module rod_joint_coupon_spigot() {
    difference() {
        union() {
            rod_spigot();
            rod_square(rod_joint_x,rod_joint_x+rod_coupon_spigot_stub,rod_w);
        }
        rod_cross_bore(rod_joint_x+rod_coupon_spigot_stub/2+3);
    }
}
module rod_rack_coupon() {
    rod_coupon_housing(rod_sleeve_x,rod_rack_dz,rod_rack_coupon_depth) rod_rack_cuts();
    rod_rack_adds();
}
// Bar frame, cut between pockets; the test-pin bore runs along Y beneath the pockets.
module rod_rack_coupon_bar() {
    difference() {
        intersection() {
            rod_inner();
            rod_square(rod_rack_coupon_bar[0],rod_rack_coupon_bar[1],rod_w);
        }
        rod_cross_bore(rod_rack_coupon_bar[1]-12,false);
    }
}

echo(str("pushrod Toro 77502 estimate: planar_span_mm=",rod_planar_span,
         " lateral_offset_mm=",rod_lateral_offset," skew_deg=",rod_skew_deg,
         " pin_lengths_mm=",rod_min_len,"/",rod_nominal_len,"/",rod_max_len,
         " rack_pitch_mm=",rod_index_step," settings=",rod_index_count,
         " trim_shift_per_step_mm=",rod_trim_shift,
         " print_heights_mm servo_end=",rod_joint_x+rod_pin_edge," sleeve=",
         rod_sleeve_x-rod_joint_x+rod_spigot_insert," inner_flat=",rod_inner_reach+rod_pin_edge,
         " overlap_at_max_mm=",rod_sleeve_x-rod_inner_tip(rod_last_setting()),
         " hold_target_n=",rod_hold_target_n,"; fit/load testing only"));

// Upright pieces: rod +X turned to -Z, mouth on the bed, lever open (as printed).
module rod_upright(mouth) { translate([0,0,mouth]) rotate([0,90,0]) children(); }
if (rod_part == "servo_end") rod_upright(rod_joint_x) { rod_servo_end(); rod_joint_lever(0); }
if (rod_part == "sleeve") rod_upright(rod_sleeve_x) { rod_sleeve(); rod_rack_lever(0); }
// The bar prints lying flat, rod +Z up; its rack is on the +Y side face.
if (rod_part == "inner") translate([rod_inner_reach,0,rod_inner_w/2]) rod_inner();
if (rod_part == "gauge") rod_gauge();
if (rod_part == "joint_coupon") rod_upright(rod_joint_x) { rod_joint_coupon(); rod_joint_lever(0); }
if (rod_part == "joint_coupon_spigot")
    rod_upright(rod_joint_x+rod_coupon_spigot_stub) rod_joint_coupon_spigot();
if (rod_part == "rack_coupon") rod_upright(rod_sleeve_x) { rod_rack_coupon(); rod_rack_lever(0); }
if (rod_part == "rack_coupon_bar")
    translate([-rod_rack_coupon_bar[0],0,rod_inner_w/2]) rod_rack_coupon_bar();
